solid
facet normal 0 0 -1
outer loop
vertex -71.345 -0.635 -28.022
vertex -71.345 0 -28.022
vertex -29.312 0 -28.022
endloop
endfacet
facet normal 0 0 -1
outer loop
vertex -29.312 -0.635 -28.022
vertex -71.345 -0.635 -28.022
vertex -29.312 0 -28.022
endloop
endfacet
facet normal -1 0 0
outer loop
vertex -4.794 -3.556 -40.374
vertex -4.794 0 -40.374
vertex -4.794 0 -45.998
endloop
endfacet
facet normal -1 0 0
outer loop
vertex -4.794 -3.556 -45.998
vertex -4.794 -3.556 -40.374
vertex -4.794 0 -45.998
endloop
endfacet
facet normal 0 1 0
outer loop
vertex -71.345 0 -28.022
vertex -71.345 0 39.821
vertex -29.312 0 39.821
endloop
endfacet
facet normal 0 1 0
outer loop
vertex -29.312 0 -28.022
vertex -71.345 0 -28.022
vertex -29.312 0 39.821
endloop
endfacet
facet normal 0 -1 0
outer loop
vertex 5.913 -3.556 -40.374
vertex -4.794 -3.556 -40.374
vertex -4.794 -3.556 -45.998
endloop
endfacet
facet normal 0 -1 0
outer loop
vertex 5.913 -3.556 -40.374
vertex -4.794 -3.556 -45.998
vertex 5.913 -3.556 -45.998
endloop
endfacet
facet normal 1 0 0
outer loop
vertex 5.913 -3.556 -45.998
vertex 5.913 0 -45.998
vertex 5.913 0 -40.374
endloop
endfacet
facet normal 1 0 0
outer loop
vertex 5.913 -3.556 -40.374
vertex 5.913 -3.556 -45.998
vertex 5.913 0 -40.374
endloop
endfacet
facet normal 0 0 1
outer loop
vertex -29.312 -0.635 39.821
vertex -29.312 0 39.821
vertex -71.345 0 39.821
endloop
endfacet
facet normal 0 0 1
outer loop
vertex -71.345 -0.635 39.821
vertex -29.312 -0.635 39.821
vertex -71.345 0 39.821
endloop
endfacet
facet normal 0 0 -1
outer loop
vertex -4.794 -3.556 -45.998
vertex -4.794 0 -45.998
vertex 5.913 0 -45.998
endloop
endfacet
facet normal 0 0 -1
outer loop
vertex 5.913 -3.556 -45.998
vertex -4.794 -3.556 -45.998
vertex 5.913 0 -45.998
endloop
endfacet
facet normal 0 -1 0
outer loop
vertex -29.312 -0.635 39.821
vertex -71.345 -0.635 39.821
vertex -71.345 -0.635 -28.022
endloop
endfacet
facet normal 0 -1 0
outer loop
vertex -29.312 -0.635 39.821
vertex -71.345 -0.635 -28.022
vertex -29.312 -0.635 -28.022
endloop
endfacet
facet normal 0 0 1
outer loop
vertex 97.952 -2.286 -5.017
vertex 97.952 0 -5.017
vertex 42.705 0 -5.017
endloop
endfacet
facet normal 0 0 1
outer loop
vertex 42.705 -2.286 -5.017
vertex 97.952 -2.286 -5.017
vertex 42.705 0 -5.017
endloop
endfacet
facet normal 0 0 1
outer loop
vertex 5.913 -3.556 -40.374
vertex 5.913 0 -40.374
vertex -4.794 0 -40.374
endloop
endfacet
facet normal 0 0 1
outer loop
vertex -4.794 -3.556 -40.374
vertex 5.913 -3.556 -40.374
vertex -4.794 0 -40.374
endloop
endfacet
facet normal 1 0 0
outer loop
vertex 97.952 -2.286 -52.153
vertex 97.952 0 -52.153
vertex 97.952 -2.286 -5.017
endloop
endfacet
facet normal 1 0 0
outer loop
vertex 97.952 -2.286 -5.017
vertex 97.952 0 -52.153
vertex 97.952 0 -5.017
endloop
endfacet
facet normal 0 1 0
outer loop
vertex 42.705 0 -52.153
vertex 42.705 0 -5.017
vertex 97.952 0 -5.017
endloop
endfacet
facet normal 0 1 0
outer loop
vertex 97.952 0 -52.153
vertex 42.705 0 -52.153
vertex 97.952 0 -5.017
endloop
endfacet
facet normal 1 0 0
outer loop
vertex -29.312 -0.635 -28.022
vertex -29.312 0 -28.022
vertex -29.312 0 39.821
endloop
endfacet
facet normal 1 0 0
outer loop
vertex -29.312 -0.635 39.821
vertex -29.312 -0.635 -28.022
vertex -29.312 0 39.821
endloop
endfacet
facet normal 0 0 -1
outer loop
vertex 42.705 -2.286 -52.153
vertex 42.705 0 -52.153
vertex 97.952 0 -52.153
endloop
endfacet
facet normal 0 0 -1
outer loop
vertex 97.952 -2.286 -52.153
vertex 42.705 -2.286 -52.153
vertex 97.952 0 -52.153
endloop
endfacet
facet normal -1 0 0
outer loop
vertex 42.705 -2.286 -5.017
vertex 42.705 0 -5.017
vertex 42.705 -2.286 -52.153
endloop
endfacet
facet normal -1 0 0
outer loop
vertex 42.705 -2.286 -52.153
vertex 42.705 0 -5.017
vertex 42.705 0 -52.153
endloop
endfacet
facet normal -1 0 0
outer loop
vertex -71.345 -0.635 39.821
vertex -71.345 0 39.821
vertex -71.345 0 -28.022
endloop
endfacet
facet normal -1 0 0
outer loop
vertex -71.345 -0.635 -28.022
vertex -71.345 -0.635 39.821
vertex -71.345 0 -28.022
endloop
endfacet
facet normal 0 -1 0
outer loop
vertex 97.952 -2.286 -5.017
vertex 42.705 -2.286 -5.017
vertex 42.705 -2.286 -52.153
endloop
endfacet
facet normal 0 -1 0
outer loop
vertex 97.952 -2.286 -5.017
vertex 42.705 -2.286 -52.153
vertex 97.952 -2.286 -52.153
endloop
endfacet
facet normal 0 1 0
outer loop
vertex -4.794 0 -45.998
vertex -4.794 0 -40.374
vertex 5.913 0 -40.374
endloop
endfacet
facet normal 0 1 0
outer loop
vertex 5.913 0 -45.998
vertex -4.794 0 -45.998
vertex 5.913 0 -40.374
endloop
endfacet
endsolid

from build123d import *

# Parameters (mm, degrees)
F1_DEPTH = 0.635
F2_DEPTH = 3.556
F3_DEPTH = 2.286


with BuildPart() as f1:
    # F0 (on Front) → F1 (new body)
    with BuildSketch(Plane.XZ):
        Polygon((-29.3124206364, 39.8206487298), (-71.3453218341, 39.8206487298), (-71.3453218341, -28.0219372362), (-61.021450907, -28.0219372362), (-48.3009703457, -28.0219372362), (-29.3124206364, -28.0219372362), align=None)
    extrude(amount=F1_DEPTH)


with BuildPart() as f2:
    # F0 (on Front) → F2 (new body)
    with BuildSketch(Plane.XZ):
        Polygon((-4.7940909863, -40.3737090528), (-4.7940909863, -43.1860495352), (-4.7940909863, -45.9983900177), (5.9134630722, -45.9983900177), (5.9134630722, -40.3737090528), align=None)
    extrude(amount=F2_DEPTH)


with BuildPart() as f3:
    # F0 (on Front) → F3 (new body)
    with BuildSketch(Plane.XZ):
        Polygon((97.9521423578, -5.0171883777), (42.7046529949, -5.0171883777), (42.7046529949, -25.2566132694), (42.7046529949, -52.1529465914), (97.9521423578, -52.1529465914), align=None)
    extrude(amount=F3_DEPTH)


solid = Compound([f1.part, f2.part, f3.part])
